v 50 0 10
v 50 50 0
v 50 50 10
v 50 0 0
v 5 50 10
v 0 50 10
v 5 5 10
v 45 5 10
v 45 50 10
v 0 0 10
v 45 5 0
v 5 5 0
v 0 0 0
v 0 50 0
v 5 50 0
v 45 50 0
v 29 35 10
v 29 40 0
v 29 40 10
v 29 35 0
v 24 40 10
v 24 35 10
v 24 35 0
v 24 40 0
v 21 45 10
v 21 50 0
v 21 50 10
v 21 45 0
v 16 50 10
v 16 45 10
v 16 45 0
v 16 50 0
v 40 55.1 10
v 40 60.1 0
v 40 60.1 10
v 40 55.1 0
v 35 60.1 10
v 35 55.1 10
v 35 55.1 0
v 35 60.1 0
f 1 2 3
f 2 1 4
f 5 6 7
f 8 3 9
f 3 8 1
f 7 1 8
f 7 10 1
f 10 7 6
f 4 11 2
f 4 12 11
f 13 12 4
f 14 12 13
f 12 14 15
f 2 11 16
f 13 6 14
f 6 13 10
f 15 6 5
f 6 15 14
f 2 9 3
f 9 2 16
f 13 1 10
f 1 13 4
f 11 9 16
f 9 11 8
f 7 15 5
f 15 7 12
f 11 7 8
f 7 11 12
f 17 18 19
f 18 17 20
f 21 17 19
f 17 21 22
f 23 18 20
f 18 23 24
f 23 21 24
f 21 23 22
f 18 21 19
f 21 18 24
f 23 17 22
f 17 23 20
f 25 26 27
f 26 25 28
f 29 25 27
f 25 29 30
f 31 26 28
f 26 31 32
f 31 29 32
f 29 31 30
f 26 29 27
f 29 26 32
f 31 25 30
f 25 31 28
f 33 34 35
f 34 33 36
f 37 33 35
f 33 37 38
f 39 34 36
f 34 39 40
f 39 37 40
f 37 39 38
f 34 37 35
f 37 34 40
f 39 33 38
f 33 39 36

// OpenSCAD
difference() {
    cube([50,50,10]);
    translate([5,5,0]) {
        cube([40,45,10]);
    }
}

translate([24, 35, 0]) {
    cube([5, 5, 10]);
}
translate([16,45,0]) {
    cube([5,5,10]);
}
translate([35,55.1,0]) {
    cube([5,5,10]);
}
